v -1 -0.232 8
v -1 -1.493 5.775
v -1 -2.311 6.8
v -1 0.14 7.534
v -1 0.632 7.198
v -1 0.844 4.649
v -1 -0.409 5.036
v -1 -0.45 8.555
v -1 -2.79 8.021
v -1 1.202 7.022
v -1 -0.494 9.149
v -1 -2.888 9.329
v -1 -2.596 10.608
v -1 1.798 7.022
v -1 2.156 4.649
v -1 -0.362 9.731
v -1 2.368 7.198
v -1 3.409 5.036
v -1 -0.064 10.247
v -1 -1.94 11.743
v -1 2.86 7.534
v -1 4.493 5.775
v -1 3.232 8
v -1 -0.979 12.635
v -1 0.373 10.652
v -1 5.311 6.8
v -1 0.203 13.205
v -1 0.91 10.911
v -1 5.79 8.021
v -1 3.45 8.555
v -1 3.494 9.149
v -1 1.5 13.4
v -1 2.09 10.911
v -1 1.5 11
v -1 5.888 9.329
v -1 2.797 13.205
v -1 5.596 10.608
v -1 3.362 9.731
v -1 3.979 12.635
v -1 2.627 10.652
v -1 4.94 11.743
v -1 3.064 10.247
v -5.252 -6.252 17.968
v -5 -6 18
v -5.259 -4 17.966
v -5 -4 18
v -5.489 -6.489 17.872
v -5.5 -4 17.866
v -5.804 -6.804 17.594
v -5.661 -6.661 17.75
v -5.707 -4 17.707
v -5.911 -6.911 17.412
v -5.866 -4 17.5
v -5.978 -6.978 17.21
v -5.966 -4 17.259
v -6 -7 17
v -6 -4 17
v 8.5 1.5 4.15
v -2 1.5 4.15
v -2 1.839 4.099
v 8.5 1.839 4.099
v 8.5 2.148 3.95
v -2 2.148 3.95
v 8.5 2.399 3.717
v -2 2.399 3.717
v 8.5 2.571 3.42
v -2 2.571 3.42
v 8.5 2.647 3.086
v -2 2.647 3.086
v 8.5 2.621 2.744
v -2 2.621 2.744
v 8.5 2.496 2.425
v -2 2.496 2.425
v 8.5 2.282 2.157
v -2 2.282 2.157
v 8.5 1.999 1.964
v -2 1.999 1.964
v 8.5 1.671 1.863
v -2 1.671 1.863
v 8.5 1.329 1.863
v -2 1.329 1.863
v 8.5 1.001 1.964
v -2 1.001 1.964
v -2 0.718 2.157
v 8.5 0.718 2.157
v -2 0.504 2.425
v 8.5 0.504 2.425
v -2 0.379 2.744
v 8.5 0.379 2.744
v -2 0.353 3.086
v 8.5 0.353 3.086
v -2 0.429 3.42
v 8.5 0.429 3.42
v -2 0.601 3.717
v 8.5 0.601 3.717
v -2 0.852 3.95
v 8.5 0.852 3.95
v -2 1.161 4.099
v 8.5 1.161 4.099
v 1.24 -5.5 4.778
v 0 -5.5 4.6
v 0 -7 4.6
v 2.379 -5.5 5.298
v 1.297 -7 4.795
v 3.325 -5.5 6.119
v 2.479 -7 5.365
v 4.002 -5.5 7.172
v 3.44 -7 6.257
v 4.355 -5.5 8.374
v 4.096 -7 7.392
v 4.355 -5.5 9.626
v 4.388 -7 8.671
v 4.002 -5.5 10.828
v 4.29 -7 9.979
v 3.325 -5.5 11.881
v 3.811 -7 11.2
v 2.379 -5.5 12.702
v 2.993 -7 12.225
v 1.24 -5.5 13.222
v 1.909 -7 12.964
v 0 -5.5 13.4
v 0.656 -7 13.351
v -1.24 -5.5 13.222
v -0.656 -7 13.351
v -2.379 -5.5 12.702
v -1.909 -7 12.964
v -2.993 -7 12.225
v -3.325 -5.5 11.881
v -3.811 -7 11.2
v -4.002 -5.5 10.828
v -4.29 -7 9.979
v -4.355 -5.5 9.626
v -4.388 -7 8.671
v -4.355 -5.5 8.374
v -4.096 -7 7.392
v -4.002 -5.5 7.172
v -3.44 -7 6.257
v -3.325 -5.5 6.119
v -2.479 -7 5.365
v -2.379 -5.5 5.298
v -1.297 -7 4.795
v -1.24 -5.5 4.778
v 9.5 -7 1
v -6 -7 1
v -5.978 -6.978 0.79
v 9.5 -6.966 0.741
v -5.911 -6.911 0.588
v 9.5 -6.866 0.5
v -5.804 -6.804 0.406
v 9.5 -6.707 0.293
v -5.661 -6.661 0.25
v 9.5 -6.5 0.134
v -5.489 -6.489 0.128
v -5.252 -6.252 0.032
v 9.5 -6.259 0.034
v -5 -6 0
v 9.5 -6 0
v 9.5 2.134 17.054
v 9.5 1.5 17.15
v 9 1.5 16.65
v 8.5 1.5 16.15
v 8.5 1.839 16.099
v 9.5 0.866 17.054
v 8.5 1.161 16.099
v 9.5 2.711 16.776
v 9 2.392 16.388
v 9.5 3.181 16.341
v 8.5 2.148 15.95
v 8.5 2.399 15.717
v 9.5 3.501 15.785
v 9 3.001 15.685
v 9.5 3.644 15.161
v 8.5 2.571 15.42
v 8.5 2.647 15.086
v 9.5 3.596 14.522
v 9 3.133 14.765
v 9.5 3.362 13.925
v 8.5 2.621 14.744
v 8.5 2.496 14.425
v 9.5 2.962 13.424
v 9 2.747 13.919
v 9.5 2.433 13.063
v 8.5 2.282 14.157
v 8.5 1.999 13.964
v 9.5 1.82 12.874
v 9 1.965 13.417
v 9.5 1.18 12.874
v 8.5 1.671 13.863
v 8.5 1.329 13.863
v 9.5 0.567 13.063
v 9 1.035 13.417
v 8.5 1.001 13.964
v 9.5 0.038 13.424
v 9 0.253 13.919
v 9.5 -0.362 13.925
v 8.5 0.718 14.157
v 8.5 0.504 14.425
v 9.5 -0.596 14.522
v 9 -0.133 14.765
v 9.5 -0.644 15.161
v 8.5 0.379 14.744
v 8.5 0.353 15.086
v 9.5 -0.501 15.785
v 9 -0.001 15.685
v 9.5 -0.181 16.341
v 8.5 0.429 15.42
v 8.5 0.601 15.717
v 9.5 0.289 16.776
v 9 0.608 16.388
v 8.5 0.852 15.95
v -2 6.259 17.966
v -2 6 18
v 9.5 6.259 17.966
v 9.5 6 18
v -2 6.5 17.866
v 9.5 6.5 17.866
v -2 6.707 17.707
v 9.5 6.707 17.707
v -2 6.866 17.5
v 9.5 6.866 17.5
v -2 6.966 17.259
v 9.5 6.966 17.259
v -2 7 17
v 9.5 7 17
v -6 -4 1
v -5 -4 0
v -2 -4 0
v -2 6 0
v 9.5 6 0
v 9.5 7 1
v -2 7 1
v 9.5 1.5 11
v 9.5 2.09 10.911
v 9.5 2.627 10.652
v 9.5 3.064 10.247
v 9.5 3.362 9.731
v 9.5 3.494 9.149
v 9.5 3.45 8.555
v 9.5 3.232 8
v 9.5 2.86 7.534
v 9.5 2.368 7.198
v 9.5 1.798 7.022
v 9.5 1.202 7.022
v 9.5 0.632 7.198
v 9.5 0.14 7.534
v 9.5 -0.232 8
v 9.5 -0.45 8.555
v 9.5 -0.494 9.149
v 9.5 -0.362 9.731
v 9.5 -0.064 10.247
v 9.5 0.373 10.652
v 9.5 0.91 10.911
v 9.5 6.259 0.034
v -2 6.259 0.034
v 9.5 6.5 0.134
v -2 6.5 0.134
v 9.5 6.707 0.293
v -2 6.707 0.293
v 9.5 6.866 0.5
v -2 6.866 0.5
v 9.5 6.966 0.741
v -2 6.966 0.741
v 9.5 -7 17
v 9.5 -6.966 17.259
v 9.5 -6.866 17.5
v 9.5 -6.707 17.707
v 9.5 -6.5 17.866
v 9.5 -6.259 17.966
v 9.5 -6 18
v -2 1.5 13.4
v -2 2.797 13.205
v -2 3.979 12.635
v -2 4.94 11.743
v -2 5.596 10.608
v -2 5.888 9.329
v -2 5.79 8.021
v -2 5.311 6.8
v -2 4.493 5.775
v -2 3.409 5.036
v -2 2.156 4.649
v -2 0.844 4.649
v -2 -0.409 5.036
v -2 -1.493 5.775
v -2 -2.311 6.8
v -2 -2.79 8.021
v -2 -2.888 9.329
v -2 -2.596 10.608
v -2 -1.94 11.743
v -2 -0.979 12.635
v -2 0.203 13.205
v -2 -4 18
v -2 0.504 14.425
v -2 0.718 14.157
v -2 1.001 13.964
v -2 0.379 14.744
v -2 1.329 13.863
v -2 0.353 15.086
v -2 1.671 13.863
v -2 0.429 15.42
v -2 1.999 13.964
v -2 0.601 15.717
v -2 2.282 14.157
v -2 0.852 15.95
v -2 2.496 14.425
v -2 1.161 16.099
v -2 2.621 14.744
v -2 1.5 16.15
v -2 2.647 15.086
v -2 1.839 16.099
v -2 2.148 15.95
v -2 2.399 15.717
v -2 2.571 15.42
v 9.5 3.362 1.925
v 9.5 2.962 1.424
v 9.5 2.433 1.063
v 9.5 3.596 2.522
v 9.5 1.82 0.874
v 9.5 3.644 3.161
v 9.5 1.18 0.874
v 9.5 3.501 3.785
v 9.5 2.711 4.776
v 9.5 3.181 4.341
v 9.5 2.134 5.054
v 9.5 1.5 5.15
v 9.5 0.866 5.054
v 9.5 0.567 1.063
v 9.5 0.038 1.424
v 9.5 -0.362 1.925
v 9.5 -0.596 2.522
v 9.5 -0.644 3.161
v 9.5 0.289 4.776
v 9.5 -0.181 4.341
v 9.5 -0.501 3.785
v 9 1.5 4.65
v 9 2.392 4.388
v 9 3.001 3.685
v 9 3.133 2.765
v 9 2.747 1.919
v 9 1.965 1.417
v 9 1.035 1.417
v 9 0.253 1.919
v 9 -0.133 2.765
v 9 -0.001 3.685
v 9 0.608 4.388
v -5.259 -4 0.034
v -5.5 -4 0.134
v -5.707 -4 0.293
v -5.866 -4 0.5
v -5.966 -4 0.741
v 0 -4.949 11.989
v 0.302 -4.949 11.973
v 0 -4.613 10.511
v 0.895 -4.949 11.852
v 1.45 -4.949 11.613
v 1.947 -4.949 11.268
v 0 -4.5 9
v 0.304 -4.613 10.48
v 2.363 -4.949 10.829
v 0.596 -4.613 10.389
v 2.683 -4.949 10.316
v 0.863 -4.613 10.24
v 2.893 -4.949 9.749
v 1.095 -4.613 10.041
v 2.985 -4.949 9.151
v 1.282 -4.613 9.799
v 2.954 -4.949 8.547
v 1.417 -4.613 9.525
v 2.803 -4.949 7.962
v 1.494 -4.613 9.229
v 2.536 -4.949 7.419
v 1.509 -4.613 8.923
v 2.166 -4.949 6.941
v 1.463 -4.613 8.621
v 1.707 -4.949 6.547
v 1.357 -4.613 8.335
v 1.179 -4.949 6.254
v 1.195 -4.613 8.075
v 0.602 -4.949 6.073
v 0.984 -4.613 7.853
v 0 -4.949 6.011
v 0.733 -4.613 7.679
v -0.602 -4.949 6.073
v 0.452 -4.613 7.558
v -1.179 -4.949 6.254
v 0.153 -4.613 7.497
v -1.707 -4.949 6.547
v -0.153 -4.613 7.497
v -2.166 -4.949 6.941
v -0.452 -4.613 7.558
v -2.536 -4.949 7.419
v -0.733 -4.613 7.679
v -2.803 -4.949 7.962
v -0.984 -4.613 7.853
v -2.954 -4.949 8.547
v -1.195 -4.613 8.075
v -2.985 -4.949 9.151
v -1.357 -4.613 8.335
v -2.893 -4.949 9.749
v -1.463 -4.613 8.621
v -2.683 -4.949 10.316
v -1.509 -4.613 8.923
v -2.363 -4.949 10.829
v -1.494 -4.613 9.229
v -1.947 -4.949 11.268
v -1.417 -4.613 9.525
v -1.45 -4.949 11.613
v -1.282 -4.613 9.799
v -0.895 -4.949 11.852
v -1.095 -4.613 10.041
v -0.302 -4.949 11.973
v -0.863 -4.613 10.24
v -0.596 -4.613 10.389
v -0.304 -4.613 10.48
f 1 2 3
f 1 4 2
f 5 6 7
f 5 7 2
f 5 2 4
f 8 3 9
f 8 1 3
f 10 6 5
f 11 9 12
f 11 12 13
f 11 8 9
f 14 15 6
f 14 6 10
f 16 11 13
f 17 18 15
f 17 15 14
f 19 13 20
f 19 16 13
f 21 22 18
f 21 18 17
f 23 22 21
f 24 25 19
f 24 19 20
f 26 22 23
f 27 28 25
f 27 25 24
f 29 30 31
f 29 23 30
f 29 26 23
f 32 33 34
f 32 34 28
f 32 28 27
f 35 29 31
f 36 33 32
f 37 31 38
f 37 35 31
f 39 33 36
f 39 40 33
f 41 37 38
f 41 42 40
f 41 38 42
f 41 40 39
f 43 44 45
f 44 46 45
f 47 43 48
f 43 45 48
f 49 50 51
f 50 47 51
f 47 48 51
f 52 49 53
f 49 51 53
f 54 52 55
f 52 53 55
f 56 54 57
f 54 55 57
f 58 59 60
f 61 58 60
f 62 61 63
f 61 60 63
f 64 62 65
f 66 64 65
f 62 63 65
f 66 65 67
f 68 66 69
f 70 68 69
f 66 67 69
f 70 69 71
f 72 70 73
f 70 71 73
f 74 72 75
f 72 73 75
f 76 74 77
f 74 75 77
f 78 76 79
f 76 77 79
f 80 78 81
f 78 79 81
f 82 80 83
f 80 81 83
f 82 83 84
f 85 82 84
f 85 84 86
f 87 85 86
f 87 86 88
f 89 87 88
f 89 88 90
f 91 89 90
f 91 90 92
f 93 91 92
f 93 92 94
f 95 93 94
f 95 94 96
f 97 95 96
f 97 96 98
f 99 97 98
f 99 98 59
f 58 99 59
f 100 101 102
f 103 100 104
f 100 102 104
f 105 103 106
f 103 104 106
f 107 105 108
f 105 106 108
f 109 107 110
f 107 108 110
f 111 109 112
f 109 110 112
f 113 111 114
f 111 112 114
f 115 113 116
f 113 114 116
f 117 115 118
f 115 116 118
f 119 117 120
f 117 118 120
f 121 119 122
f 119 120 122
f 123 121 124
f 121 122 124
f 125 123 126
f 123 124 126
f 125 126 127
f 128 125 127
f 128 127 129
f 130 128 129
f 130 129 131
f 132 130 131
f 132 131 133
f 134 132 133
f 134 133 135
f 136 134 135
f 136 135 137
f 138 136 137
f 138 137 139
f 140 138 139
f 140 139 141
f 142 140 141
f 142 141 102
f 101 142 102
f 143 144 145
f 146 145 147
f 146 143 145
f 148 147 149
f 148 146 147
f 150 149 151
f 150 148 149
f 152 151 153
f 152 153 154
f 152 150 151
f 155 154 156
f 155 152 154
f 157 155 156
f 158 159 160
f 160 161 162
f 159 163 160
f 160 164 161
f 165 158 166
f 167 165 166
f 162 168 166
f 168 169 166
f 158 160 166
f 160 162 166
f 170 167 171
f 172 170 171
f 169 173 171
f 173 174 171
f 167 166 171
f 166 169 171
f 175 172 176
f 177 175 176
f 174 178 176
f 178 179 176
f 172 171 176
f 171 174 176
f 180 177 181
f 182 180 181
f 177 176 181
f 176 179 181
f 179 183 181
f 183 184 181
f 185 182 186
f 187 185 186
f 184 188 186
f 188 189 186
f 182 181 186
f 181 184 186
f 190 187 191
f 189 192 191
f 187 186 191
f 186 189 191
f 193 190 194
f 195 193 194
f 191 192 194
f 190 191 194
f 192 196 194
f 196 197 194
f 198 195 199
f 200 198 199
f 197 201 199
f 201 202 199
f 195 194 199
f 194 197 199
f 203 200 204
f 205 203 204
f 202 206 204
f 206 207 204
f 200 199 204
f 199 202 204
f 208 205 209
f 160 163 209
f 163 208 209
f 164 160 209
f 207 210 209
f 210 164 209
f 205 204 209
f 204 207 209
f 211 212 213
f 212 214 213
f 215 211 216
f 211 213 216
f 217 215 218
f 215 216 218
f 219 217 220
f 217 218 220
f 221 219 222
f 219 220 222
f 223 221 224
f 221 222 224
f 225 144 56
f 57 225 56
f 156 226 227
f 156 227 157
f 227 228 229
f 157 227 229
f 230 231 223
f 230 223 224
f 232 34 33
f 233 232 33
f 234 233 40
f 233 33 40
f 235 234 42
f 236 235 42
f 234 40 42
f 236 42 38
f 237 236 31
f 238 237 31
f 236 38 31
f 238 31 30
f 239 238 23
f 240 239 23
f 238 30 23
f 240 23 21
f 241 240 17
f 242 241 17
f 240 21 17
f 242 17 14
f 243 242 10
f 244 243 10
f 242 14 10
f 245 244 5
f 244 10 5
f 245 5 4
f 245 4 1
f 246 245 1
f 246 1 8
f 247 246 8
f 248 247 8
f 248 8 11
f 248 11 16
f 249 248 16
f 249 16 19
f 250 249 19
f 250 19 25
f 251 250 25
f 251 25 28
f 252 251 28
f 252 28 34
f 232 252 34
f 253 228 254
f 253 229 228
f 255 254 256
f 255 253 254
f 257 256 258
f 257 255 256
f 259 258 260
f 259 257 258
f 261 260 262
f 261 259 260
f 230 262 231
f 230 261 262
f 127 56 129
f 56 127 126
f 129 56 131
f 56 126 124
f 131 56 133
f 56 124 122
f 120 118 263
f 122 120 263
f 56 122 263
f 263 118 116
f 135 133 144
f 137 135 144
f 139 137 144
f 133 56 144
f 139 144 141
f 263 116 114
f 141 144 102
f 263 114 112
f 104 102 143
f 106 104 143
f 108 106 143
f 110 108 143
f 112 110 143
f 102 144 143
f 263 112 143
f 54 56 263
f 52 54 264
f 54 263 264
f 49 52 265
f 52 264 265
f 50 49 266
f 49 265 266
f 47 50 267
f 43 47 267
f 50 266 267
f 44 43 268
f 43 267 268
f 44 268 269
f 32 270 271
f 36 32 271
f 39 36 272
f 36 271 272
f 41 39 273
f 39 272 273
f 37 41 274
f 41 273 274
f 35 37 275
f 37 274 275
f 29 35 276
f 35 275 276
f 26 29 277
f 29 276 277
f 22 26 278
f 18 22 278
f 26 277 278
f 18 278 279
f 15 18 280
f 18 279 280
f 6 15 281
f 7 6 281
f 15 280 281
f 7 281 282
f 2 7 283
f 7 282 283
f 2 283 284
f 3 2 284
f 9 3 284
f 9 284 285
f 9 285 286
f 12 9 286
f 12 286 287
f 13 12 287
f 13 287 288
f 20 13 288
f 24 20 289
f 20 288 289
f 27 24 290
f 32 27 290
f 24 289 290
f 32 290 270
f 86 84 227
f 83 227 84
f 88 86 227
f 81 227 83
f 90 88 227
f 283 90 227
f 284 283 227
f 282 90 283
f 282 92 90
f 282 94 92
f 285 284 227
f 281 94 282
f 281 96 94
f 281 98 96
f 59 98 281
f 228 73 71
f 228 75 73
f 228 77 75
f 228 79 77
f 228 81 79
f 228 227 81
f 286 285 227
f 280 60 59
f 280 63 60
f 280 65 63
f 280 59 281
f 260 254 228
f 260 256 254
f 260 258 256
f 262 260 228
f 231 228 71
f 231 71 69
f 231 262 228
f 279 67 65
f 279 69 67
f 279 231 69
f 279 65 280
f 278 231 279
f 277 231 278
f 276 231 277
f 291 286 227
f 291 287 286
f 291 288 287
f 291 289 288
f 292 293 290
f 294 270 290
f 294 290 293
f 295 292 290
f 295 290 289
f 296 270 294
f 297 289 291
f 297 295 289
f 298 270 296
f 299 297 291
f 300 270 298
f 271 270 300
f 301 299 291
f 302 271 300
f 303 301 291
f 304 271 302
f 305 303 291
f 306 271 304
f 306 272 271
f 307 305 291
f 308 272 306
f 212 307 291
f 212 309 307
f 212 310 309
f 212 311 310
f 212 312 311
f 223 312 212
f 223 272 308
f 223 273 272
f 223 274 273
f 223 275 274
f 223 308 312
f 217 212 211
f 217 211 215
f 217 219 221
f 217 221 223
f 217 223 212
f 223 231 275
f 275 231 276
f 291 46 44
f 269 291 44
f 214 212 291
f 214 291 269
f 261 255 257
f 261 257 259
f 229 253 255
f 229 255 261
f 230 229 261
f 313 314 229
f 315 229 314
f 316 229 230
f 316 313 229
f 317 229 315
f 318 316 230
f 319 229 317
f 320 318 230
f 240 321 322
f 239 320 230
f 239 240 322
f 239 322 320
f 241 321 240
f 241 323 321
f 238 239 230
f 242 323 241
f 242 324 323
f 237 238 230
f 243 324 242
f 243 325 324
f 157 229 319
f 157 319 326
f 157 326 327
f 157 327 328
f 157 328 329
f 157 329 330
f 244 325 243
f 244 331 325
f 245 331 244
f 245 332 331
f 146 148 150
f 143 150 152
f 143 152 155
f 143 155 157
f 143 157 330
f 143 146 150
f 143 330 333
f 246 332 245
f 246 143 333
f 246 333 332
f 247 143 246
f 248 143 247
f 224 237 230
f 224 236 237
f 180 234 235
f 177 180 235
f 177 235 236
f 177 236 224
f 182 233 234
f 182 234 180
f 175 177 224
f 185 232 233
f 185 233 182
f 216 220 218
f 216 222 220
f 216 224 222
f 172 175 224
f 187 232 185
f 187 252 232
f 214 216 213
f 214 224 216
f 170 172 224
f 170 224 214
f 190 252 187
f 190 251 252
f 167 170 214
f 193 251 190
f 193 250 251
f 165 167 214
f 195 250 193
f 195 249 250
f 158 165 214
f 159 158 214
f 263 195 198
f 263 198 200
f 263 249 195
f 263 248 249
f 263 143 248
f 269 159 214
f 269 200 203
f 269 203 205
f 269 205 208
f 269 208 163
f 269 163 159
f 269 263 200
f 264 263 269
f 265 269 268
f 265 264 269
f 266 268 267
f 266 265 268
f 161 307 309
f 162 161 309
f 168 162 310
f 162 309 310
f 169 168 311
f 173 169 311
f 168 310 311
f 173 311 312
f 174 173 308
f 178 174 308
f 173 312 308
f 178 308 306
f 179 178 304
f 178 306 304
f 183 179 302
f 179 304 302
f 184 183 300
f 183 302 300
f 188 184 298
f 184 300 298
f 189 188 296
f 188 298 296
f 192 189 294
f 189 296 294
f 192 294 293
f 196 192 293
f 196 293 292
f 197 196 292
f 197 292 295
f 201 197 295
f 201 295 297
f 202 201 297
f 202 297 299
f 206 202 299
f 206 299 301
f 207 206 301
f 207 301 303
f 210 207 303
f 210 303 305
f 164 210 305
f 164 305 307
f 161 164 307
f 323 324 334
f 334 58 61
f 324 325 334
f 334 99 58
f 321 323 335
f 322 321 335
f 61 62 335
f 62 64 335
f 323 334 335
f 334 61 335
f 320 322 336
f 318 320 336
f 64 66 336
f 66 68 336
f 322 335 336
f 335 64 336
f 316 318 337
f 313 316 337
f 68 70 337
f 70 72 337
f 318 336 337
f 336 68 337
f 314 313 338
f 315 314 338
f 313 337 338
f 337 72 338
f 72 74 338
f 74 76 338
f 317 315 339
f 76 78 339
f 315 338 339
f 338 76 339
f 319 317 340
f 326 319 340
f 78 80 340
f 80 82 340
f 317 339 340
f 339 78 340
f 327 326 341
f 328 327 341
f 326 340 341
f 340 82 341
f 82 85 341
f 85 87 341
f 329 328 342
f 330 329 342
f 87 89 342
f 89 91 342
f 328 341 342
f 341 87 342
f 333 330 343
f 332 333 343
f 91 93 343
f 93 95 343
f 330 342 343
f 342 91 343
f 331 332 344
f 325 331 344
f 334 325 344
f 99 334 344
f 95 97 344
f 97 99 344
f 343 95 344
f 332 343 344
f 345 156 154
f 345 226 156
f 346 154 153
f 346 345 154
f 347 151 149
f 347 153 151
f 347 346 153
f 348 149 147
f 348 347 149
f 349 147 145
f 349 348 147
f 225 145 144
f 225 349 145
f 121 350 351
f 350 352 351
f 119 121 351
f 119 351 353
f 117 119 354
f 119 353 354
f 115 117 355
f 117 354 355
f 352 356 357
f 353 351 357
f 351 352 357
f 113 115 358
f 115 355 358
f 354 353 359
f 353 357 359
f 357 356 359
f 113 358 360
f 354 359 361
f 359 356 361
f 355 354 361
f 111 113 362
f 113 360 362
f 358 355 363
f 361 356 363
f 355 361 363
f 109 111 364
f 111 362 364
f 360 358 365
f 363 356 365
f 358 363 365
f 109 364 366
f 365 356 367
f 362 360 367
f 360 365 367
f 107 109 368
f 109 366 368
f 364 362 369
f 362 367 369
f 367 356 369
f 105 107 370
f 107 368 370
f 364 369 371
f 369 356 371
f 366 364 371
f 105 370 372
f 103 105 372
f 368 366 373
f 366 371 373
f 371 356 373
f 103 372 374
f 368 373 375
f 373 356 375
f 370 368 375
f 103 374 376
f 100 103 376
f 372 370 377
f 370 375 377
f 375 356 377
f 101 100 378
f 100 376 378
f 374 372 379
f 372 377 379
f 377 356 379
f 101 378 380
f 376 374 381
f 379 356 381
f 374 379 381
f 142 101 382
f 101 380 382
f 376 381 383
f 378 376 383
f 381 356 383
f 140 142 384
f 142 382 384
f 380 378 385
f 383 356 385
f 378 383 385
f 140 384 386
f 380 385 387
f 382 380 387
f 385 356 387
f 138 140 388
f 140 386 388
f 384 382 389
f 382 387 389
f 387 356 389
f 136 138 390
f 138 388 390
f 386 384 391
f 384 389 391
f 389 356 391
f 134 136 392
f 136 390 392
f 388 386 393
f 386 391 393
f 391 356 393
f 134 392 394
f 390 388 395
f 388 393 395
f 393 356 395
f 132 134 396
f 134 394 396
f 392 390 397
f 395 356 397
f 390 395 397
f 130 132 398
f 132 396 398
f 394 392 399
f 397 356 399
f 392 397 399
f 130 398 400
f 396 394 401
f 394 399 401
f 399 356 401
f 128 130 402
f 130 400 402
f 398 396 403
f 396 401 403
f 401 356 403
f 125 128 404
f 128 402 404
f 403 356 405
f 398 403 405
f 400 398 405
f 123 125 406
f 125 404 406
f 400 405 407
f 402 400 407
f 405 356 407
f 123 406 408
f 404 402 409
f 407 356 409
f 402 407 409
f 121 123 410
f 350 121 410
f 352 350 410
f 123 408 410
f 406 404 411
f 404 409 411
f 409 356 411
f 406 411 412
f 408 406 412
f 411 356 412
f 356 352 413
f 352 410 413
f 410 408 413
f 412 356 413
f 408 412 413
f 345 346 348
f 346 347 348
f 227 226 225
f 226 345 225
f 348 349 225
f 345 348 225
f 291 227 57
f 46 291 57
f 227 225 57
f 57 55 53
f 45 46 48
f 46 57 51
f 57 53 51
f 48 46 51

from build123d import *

# Parameters (mm, degrees)
SKETCH_2_W           = 20
SKETCH_2_H           = 14
EXTRUDE_1_DEPTH      = 18
SKETCH_6_R           = 4.4
CUT_EXTRUDE_4_DEPTH  = 1.5
DOME_1_FACE_RADIUS   = 4.4
DOME_1_HEIGHT        = 1
SKETCH_7_W           = 0.5
SKETCH_7_H           = 18
CUT_EXTRUDE_5_DEPTH  = 20
SKETCH_8_W           = 4
SKETCH_8_H           = 18
CUT_EXTRUDE_6_DEPTH  = 27
SKETCH_12_W          = 18
SKETCH_12_H          = 11
CUT_EXTRUDE_9_DEPTH  = 4
SKETCH_13_R          = 2
SKETCH_13_R_2        = 1.15
CUT_EXTRUDE_10_DEPTH = 15.5
SKETCH_14_R          = 4.4
CUT_EXTRUDE_11_DEPTH = 1
CHAMFER_1_SIZE       = 1
FILLET_1_R           = 1


with BuildPart() as part:
    # 草图2 → 凸台-拉伸1 (new body)
    with BuildSketch(Plane.XY):
        Rectangle(SKETCH_2_W, SKETCH_2_H)
    extrude(amount=EXTRUDE_1_DEPTH)

    # 草图6 → 切除-拉伸4 (cut)
    with BuildSketch(Plane.XZ.offset(7)):
        with Locations(Location((0, 9, 0), (0, 0, 270))):
            Circle(SKETCH_6_R)
    extrude(amount=-CUT_EXTRUDE_4_DEPTH, mode=Mode.SUBTRACT)

    # 圆顶1: a dome of height H over a round flat face of radius A is a cap of a sphere of radius (A * A + H * H) / (2 * H)
    dome_1_r = (DOME_1_FACE_RADIUS * DOME_1_FACE_RADIUS + DOME_1_HEIGHT * DOME_1_HEIGHT) / (2 * DOME_1_HEIGHT)
    dome_1_base = Plane((0, -5.5, 9), z_dir=(0, 1, 0))
    with Locations(dome_1_base.offset(DOME_1_HEIGHT - dome_1_r)):
        dome_1_ball = Sphere(dome_1_r, mode=Mode.PRIVATE)
    add(split(dome_1_ball, bisect_by=dome_1_base, keep=Keep.TOP, mode=Mode.PRIVATE), mode=Mode.SUBTRACT)

    # 草图7 → 切除-拉伸5 (cut)
    with BuildSketch(Plane.XZ.offset(7)):
        with Locations((9.75, 9)):
            Rectangle(SKETCH_7_W, SKETCH_7_H)
    extrude(amount=-CUT_EXTRUDE_5_DEPTH, mode=Mode.SUBTRACT)

    # 草图8 → 切除-拉伸6 (cut)
    with BuildSketch(Plane.XZ.offset(7)):
        with Locations((-8, 9)):
            Rectangle(SKETCH_8_W, SKETCH_8_H)
    extrude(amount=-CUT_EXTRUDE_6_DEPTH, mode=Mode.SUBTRACT)

    # 草图12 → 切除-拉伸9 (cut)
    with BuildSketch(Plane.ZY.offset(6)):
        with Locations((9, 1.5)):
            Rectangle(SKETCH_12_W, SKETCH_12_H)
    extrude(amount=-CUT_EXTRUDE_9_DEPTH, mode=Mode.SUBTRACT)

    # 草图13 → 切除-拉伸10 (cut)
    with BuildSketch(Plane.ZY.offset(2)):
        with Locations((9, 1.5)):
            Circle(SKETCH_13_R)
        with Locations((3, 1.5)):
            Circle(SKETCH_13_R_2)
        with Locations((15, 1.5)):
            Circle(SKETCH_13_R_2)
    extrude(amount=-CUT_EXTRUDE_10_DEPTH, mode=Mode.SUBTRACT)

    # 草图14 → 切除-拉伸11 (cut)
    with BuildSketch(Plane.ZY.offset(2)):
        with Locations((9, 1.5)):
            Circle(SKETCH_14_R)
    extrude(amount=-CUT_EXTRUDE_11_DEPTH, mode=Mode.SUBTRACT)

    # 倒角1
    chamfer_1_edges = [part.edges().sort_by_distance(p)[0] for p in [
        (9.5, 1.5, 13.85),
        (9.5, 1.5, 1.85),
    ]]
    chamfer(chamfer_1_edges, length=CHAMFER_1_SIZE)

    # 圆角1
    fillet_1_edges = [part.edges().sort_by_distance(p)[0] for p in [
        (3.75, 7, 0),
        (3.75, 7, 18),
        (1.75, -7, 0),
        (1.75, -7, 18),
        (-6, -5.5, 0),
        (-6, -5.5, 18),
    ]]
    fillet(fillet_1_edges, radius=FILLET_1_R)


solid = part.part
